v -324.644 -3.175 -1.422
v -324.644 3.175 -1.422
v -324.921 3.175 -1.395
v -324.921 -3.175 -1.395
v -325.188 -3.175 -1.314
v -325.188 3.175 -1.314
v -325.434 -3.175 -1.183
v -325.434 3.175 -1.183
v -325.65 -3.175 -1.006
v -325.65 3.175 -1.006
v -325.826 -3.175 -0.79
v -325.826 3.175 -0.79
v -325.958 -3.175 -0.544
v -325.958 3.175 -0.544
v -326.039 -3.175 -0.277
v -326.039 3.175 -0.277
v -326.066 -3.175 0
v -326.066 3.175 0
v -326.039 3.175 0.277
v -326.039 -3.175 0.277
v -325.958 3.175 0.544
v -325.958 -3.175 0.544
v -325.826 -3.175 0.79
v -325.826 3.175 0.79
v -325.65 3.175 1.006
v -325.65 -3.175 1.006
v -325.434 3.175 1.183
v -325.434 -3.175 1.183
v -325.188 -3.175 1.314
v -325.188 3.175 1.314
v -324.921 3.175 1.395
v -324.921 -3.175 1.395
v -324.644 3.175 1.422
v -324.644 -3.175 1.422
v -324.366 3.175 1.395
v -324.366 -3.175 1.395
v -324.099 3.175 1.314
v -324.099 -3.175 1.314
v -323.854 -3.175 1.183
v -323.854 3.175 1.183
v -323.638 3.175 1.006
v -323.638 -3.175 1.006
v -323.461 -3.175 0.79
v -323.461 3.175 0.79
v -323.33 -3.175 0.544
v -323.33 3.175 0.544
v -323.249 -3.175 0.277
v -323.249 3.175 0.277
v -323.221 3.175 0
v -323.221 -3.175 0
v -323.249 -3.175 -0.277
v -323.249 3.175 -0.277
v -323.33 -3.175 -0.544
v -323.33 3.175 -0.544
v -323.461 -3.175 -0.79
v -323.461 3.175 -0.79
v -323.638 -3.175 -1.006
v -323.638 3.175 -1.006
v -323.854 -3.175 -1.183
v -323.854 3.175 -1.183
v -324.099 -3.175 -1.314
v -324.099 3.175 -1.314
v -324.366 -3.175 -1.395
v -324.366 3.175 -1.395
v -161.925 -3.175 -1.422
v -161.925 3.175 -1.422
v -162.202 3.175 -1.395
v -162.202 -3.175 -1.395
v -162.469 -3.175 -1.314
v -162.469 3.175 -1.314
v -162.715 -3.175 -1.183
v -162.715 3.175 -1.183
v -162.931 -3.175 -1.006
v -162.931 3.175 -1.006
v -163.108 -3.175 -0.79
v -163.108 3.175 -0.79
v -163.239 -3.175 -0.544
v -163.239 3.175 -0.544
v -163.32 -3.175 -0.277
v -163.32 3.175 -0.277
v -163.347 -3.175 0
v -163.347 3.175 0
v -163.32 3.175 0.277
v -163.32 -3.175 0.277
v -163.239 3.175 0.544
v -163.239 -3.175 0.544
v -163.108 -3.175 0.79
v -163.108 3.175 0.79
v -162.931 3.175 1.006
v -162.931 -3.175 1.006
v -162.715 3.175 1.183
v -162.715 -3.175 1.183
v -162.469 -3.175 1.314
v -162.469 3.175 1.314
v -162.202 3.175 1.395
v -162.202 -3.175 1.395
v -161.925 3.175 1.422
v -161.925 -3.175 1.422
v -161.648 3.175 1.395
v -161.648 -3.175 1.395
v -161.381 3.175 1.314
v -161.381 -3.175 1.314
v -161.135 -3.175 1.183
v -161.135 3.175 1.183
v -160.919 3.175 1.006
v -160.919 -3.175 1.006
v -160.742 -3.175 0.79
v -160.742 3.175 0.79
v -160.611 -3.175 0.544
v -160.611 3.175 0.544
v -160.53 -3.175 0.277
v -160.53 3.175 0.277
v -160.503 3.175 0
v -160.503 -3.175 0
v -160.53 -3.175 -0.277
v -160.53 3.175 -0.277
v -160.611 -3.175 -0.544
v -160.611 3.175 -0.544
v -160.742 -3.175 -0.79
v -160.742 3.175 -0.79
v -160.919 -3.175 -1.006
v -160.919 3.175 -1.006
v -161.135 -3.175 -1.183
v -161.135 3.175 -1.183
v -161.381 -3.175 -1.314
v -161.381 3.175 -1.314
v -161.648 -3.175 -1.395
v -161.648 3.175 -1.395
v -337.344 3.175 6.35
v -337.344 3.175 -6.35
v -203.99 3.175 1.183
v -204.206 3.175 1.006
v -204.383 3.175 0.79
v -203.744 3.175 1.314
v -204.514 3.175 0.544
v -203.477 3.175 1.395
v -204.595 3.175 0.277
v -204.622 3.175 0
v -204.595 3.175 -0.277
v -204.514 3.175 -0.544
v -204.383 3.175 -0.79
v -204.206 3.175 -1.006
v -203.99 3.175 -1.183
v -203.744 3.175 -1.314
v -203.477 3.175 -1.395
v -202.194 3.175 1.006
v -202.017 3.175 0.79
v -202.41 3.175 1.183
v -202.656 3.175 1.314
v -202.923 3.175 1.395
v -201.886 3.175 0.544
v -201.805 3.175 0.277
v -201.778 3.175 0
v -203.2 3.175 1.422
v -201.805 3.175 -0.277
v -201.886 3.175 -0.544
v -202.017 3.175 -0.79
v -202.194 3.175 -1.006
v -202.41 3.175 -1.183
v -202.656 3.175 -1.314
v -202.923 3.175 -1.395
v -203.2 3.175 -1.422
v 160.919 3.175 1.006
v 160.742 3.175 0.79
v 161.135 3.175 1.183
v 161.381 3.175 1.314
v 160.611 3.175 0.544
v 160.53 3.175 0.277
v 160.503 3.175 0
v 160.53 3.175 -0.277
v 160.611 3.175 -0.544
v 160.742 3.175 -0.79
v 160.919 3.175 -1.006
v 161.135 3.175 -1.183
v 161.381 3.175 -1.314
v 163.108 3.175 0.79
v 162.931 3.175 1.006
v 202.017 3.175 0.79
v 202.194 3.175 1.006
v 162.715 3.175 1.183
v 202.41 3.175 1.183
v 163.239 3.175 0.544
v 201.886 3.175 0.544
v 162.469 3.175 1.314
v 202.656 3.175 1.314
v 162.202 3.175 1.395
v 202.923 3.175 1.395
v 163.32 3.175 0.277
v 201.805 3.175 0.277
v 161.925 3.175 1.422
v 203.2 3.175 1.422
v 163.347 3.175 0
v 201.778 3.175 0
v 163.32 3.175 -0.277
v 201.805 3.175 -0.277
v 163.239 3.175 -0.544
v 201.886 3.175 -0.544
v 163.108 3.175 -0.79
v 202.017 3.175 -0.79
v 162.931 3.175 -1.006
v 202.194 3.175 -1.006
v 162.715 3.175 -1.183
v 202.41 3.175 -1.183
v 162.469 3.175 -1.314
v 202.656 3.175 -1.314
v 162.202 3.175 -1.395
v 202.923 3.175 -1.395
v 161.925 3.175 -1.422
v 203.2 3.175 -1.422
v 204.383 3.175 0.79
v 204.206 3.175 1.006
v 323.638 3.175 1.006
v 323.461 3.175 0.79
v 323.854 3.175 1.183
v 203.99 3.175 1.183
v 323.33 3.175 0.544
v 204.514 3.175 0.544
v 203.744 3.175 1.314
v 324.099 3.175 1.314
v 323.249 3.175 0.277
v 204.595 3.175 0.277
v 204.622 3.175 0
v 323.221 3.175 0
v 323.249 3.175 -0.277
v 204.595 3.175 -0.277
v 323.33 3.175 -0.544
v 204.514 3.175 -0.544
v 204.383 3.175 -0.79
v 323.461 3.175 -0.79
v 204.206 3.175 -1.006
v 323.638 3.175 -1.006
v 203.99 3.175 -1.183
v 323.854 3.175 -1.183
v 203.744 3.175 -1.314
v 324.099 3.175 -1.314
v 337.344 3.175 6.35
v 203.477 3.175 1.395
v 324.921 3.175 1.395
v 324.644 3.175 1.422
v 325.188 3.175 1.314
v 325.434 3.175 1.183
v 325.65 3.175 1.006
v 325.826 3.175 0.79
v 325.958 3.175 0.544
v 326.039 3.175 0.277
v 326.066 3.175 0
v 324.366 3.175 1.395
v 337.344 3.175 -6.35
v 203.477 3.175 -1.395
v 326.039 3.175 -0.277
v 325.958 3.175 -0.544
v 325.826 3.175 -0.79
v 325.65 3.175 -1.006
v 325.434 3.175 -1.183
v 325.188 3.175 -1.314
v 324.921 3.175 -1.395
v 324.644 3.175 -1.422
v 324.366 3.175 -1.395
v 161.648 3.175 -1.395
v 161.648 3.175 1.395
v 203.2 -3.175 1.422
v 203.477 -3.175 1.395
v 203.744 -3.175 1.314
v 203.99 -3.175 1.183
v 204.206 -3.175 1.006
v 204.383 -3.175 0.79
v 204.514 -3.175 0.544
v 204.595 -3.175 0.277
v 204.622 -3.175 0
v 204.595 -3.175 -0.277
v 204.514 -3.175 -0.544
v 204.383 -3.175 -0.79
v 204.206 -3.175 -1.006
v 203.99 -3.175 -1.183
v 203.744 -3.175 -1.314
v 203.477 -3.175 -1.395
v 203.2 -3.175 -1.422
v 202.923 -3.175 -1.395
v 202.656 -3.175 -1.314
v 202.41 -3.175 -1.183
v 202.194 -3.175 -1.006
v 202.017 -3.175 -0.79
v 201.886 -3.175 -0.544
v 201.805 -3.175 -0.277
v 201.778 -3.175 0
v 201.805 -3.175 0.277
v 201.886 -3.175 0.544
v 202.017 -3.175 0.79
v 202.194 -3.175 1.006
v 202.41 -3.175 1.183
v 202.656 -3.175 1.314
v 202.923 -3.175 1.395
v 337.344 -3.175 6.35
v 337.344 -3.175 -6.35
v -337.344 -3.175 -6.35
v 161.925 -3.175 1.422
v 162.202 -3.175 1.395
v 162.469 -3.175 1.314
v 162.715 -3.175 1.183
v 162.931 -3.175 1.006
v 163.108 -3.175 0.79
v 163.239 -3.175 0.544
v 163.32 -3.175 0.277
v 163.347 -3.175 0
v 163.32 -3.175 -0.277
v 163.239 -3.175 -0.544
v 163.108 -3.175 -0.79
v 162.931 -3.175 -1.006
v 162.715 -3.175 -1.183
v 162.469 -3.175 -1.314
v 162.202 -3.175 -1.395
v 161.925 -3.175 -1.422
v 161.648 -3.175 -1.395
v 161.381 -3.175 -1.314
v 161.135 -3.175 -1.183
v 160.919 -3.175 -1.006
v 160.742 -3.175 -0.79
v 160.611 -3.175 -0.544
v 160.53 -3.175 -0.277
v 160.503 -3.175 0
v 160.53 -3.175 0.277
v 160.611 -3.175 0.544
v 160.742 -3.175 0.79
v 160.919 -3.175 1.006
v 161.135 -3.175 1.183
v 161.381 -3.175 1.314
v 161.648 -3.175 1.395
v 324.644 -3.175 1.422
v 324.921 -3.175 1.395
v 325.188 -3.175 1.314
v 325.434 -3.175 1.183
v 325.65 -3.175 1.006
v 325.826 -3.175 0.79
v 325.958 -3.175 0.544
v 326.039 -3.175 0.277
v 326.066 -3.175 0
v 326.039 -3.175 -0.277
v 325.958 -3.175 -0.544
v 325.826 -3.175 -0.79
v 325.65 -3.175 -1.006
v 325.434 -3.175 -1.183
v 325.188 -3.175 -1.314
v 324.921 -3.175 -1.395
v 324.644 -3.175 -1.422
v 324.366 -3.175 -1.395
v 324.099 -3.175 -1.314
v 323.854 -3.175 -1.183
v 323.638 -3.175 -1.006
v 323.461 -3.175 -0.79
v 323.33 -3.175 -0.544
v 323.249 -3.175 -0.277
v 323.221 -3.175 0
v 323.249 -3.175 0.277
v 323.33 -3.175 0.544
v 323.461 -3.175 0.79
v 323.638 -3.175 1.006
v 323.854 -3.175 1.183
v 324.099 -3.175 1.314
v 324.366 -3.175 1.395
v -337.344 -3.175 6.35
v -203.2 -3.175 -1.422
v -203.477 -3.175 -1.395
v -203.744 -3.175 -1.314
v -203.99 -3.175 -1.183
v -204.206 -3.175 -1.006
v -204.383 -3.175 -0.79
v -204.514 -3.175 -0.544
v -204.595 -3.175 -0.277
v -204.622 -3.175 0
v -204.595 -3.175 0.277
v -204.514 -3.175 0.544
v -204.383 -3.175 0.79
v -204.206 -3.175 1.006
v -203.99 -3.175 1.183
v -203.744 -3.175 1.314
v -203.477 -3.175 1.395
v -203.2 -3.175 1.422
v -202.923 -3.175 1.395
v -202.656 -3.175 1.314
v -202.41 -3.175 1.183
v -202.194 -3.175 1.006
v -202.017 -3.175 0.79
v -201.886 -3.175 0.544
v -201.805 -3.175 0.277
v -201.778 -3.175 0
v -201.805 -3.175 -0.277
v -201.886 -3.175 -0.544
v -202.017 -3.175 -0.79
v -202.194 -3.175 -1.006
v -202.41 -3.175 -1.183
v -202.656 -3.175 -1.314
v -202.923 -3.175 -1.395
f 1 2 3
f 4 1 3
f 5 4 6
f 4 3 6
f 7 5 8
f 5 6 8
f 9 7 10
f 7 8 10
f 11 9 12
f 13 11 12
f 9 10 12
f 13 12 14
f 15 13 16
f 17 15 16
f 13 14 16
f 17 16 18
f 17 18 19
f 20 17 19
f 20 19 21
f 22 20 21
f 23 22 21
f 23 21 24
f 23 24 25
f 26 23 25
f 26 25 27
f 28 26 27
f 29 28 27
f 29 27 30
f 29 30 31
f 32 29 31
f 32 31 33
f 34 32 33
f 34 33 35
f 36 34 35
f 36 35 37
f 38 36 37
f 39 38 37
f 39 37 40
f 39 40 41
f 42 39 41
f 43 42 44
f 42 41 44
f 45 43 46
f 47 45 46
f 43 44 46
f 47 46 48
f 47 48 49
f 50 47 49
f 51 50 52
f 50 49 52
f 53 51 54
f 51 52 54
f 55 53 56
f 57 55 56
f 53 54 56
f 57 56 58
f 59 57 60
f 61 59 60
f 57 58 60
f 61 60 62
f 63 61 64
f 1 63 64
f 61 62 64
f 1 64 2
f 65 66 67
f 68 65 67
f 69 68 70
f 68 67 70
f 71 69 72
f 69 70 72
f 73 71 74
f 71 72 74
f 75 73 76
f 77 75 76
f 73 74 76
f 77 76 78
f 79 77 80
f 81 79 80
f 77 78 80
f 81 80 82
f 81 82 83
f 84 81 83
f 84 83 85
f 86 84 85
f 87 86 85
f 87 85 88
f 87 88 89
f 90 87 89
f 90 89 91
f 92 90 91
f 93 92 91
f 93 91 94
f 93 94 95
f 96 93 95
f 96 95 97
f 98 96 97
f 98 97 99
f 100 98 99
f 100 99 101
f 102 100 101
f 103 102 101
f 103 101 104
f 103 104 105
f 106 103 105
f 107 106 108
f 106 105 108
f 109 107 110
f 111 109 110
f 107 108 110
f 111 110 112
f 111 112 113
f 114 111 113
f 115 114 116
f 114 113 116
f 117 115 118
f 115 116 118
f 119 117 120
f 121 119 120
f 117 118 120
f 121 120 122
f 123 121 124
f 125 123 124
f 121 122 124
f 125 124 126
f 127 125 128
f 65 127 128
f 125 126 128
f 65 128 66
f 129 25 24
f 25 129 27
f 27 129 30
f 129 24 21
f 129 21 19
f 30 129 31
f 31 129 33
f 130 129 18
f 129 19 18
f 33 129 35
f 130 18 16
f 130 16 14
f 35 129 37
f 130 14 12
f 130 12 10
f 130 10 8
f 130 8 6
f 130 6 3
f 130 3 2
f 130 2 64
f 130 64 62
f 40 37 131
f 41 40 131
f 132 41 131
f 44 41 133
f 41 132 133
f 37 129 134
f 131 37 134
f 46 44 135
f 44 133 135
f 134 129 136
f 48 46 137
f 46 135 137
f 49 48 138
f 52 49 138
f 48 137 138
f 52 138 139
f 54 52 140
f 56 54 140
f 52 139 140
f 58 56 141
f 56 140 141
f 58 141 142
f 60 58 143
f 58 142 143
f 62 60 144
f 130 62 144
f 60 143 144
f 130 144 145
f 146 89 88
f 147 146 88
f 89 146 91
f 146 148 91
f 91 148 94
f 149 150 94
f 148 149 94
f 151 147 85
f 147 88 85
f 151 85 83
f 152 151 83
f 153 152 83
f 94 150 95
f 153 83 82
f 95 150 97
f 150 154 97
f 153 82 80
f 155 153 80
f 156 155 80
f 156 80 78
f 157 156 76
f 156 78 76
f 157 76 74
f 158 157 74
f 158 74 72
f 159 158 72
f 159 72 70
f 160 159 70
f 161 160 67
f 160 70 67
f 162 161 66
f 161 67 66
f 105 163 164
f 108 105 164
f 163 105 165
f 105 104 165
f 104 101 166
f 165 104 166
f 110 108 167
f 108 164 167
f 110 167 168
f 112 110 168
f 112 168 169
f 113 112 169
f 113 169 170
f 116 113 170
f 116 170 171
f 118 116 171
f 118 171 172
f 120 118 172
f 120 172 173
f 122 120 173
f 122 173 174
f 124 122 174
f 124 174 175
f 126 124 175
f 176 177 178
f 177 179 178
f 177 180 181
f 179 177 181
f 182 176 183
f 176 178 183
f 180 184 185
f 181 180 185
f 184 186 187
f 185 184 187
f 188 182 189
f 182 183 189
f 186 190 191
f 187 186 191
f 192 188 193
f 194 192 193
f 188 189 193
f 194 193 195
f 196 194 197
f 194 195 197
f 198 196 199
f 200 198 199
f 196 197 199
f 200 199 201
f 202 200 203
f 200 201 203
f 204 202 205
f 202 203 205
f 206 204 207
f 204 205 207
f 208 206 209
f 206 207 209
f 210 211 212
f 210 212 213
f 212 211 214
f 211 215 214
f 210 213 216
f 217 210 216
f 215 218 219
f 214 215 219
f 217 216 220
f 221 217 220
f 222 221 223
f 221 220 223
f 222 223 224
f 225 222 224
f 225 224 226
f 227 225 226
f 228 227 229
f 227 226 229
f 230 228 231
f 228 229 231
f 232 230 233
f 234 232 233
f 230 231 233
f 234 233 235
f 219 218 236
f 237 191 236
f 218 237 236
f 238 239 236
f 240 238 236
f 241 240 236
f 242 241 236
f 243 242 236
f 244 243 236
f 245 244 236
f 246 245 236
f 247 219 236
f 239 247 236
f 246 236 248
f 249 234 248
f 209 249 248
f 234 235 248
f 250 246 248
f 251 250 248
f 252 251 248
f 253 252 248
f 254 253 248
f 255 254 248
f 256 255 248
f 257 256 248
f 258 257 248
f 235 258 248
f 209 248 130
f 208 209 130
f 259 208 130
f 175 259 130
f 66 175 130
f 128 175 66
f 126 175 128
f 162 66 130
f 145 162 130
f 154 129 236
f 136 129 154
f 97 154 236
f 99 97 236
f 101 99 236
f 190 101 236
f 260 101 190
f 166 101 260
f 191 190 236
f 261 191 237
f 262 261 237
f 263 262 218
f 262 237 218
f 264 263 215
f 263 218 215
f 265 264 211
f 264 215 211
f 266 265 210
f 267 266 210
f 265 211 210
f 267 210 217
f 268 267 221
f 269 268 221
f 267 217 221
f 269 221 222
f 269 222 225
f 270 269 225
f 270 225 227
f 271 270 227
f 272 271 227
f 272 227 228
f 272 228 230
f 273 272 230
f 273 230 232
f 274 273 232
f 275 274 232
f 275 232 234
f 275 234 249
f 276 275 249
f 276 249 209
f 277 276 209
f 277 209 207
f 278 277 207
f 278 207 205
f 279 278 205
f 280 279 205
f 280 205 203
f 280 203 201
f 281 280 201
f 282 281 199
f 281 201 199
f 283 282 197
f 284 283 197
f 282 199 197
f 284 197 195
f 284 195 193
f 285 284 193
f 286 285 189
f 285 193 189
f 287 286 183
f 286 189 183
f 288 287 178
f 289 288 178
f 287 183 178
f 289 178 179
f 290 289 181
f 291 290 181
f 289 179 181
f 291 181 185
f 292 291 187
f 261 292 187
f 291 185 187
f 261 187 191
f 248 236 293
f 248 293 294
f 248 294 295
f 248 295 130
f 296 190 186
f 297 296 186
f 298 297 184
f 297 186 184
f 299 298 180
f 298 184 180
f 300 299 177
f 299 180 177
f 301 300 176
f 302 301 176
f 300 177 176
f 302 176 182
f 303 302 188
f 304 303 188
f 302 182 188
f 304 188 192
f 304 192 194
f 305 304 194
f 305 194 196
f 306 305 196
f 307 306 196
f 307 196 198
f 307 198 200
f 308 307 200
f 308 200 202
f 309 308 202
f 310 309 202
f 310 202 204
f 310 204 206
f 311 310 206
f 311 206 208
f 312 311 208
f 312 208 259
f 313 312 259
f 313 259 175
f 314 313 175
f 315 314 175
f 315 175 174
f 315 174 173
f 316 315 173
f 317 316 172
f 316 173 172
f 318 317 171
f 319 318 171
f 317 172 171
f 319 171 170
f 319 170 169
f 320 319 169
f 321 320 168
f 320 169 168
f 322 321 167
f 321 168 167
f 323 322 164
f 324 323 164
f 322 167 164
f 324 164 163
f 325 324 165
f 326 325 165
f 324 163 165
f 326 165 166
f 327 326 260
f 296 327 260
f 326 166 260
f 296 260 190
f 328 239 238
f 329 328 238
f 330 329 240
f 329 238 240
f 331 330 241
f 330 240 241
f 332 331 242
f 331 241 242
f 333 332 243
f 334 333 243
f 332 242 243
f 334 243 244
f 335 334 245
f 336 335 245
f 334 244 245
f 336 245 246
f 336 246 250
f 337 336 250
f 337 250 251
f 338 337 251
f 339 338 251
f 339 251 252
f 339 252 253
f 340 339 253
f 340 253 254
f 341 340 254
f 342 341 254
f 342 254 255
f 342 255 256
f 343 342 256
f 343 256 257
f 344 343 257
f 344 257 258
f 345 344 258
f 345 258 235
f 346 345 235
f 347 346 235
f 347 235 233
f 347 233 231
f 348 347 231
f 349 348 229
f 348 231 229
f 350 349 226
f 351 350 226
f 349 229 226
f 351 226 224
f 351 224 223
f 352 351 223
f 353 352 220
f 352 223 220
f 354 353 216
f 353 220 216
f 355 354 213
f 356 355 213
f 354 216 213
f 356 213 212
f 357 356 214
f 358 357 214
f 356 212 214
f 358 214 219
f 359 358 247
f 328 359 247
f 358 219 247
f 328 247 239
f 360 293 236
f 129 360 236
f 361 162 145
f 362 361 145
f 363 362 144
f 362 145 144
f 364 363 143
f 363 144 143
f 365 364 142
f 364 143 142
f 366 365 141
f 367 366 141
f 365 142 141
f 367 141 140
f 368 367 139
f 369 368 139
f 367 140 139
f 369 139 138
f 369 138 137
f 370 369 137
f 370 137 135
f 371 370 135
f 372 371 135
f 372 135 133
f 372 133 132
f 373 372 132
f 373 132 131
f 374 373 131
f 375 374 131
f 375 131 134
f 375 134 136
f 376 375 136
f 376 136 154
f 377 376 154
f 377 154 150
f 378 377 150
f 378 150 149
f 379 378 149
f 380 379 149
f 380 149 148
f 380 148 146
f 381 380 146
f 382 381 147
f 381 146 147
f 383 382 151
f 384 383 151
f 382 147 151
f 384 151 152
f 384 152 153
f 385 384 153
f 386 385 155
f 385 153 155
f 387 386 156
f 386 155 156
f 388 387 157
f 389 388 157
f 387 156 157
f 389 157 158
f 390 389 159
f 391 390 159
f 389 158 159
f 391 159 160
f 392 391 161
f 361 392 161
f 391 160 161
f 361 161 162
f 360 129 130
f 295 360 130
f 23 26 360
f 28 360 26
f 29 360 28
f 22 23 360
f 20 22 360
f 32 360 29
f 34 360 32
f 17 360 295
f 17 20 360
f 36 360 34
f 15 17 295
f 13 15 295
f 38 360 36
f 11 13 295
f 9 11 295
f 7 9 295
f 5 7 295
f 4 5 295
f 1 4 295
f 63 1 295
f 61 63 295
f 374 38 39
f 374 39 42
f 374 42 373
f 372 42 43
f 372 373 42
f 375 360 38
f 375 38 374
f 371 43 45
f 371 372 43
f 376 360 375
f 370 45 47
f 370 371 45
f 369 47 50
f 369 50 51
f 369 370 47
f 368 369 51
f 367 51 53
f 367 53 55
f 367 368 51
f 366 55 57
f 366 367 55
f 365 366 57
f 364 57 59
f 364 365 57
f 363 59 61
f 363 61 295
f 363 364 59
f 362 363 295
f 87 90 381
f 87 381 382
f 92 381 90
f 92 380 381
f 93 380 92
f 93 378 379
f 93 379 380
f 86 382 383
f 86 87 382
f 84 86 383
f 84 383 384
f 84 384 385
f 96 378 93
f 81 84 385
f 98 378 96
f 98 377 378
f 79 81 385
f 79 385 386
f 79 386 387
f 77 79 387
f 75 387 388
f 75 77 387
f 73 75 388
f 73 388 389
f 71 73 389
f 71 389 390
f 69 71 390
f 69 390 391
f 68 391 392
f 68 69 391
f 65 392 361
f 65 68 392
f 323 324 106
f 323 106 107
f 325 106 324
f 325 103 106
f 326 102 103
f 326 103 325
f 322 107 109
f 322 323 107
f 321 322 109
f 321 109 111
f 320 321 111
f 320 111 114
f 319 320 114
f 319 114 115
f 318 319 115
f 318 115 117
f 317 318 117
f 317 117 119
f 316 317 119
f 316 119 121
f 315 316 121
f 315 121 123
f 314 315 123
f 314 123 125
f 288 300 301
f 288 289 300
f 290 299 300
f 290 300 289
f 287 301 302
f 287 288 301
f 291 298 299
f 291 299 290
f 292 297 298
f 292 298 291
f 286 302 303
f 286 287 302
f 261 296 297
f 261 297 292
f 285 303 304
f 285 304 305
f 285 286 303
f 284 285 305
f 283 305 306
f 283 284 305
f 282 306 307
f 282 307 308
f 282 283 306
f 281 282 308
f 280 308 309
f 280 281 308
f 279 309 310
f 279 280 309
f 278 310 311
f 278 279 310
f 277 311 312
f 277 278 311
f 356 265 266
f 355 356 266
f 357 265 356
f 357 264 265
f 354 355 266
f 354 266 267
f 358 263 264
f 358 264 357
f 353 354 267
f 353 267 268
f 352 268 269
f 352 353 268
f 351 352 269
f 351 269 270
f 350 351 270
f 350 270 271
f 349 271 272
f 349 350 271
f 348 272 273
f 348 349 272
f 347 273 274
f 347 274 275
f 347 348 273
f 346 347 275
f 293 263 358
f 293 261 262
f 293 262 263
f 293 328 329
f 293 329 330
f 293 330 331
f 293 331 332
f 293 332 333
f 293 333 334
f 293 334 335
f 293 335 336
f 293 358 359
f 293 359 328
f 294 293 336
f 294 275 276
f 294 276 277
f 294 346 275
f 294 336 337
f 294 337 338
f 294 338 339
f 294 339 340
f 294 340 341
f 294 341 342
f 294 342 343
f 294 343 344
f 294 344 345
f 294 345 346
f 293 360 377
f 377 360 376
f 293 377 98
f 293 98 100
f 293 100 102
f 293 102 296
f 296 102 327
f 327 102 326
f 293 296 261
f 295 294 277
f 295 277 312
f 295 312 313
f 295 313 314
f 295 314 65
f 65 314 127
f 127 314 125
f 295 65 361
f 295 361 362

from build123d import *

# Parameters (mm, degrees)
SKETCH1_W           = 12.7
SKETCH1_H           = 6.35
BOSS_EXTRUDE1_DEPTH = 337.34375
SKETCH2_R           = 1.4224
CUT_EXTRUDE1_DEPTH  = 7.35


with BuildPart() as part:
    # Sketch1 → Boss-Extrude1 (new body, symmetric)
    with BuildSketch(Plane(origin=(0, 0, 0), x_dir=(0, 0, -1), z_dir=(1, 0, 0))):
        Rectangle(SKETCH1_W, SKETCH1_H)
    extrude(amount=BOSS_EXTRUDE1_DEPTH, both=True)

    # Sketch2 → Cut-Extrude1 (cut, through all)
    with BuildSketch(Plane(origin=(0, 3.175, 0), x_dir=(1, 0, 0), z_dir=(0, 1, 0))):
        with Locations(Location((161.925, 0, 0), (0, 0, 270))):  # turned: the seam where the file's is
            Circle(SKETCH2_R)
        with Locations(Location((203.2, 0, 0), (0, 0, 270))):  # turned: the seam where the file's is
            Circle(SKETCH2_R)
        with Locations(Location((-203.2, 0, 0), (0, 0, 90))):  # turned: the seam where the file's is
            Circle(SKETCH2_R)
        with Locations(Location((-161.925, 0, 0), (0, 0, 90))):  # turned: the seam where the file's is
            Circle(SKETCH2_R)
        with Locations(Location((324.64375, 0, 0), (0, 0, 270))):  # turned: the seam where the file's is
            Circle(SKETCH2_R)
        with Locations(Location((-324.64375, 0, 0), (0, 0, 90))):  # turned: the seam where the file's is
            Circle(SKETCH2_R)
    extrude(amount=-CUT_EXTRUDE1_DEPTH, mode=Mode.SUBTRACT)


solid = part.part
